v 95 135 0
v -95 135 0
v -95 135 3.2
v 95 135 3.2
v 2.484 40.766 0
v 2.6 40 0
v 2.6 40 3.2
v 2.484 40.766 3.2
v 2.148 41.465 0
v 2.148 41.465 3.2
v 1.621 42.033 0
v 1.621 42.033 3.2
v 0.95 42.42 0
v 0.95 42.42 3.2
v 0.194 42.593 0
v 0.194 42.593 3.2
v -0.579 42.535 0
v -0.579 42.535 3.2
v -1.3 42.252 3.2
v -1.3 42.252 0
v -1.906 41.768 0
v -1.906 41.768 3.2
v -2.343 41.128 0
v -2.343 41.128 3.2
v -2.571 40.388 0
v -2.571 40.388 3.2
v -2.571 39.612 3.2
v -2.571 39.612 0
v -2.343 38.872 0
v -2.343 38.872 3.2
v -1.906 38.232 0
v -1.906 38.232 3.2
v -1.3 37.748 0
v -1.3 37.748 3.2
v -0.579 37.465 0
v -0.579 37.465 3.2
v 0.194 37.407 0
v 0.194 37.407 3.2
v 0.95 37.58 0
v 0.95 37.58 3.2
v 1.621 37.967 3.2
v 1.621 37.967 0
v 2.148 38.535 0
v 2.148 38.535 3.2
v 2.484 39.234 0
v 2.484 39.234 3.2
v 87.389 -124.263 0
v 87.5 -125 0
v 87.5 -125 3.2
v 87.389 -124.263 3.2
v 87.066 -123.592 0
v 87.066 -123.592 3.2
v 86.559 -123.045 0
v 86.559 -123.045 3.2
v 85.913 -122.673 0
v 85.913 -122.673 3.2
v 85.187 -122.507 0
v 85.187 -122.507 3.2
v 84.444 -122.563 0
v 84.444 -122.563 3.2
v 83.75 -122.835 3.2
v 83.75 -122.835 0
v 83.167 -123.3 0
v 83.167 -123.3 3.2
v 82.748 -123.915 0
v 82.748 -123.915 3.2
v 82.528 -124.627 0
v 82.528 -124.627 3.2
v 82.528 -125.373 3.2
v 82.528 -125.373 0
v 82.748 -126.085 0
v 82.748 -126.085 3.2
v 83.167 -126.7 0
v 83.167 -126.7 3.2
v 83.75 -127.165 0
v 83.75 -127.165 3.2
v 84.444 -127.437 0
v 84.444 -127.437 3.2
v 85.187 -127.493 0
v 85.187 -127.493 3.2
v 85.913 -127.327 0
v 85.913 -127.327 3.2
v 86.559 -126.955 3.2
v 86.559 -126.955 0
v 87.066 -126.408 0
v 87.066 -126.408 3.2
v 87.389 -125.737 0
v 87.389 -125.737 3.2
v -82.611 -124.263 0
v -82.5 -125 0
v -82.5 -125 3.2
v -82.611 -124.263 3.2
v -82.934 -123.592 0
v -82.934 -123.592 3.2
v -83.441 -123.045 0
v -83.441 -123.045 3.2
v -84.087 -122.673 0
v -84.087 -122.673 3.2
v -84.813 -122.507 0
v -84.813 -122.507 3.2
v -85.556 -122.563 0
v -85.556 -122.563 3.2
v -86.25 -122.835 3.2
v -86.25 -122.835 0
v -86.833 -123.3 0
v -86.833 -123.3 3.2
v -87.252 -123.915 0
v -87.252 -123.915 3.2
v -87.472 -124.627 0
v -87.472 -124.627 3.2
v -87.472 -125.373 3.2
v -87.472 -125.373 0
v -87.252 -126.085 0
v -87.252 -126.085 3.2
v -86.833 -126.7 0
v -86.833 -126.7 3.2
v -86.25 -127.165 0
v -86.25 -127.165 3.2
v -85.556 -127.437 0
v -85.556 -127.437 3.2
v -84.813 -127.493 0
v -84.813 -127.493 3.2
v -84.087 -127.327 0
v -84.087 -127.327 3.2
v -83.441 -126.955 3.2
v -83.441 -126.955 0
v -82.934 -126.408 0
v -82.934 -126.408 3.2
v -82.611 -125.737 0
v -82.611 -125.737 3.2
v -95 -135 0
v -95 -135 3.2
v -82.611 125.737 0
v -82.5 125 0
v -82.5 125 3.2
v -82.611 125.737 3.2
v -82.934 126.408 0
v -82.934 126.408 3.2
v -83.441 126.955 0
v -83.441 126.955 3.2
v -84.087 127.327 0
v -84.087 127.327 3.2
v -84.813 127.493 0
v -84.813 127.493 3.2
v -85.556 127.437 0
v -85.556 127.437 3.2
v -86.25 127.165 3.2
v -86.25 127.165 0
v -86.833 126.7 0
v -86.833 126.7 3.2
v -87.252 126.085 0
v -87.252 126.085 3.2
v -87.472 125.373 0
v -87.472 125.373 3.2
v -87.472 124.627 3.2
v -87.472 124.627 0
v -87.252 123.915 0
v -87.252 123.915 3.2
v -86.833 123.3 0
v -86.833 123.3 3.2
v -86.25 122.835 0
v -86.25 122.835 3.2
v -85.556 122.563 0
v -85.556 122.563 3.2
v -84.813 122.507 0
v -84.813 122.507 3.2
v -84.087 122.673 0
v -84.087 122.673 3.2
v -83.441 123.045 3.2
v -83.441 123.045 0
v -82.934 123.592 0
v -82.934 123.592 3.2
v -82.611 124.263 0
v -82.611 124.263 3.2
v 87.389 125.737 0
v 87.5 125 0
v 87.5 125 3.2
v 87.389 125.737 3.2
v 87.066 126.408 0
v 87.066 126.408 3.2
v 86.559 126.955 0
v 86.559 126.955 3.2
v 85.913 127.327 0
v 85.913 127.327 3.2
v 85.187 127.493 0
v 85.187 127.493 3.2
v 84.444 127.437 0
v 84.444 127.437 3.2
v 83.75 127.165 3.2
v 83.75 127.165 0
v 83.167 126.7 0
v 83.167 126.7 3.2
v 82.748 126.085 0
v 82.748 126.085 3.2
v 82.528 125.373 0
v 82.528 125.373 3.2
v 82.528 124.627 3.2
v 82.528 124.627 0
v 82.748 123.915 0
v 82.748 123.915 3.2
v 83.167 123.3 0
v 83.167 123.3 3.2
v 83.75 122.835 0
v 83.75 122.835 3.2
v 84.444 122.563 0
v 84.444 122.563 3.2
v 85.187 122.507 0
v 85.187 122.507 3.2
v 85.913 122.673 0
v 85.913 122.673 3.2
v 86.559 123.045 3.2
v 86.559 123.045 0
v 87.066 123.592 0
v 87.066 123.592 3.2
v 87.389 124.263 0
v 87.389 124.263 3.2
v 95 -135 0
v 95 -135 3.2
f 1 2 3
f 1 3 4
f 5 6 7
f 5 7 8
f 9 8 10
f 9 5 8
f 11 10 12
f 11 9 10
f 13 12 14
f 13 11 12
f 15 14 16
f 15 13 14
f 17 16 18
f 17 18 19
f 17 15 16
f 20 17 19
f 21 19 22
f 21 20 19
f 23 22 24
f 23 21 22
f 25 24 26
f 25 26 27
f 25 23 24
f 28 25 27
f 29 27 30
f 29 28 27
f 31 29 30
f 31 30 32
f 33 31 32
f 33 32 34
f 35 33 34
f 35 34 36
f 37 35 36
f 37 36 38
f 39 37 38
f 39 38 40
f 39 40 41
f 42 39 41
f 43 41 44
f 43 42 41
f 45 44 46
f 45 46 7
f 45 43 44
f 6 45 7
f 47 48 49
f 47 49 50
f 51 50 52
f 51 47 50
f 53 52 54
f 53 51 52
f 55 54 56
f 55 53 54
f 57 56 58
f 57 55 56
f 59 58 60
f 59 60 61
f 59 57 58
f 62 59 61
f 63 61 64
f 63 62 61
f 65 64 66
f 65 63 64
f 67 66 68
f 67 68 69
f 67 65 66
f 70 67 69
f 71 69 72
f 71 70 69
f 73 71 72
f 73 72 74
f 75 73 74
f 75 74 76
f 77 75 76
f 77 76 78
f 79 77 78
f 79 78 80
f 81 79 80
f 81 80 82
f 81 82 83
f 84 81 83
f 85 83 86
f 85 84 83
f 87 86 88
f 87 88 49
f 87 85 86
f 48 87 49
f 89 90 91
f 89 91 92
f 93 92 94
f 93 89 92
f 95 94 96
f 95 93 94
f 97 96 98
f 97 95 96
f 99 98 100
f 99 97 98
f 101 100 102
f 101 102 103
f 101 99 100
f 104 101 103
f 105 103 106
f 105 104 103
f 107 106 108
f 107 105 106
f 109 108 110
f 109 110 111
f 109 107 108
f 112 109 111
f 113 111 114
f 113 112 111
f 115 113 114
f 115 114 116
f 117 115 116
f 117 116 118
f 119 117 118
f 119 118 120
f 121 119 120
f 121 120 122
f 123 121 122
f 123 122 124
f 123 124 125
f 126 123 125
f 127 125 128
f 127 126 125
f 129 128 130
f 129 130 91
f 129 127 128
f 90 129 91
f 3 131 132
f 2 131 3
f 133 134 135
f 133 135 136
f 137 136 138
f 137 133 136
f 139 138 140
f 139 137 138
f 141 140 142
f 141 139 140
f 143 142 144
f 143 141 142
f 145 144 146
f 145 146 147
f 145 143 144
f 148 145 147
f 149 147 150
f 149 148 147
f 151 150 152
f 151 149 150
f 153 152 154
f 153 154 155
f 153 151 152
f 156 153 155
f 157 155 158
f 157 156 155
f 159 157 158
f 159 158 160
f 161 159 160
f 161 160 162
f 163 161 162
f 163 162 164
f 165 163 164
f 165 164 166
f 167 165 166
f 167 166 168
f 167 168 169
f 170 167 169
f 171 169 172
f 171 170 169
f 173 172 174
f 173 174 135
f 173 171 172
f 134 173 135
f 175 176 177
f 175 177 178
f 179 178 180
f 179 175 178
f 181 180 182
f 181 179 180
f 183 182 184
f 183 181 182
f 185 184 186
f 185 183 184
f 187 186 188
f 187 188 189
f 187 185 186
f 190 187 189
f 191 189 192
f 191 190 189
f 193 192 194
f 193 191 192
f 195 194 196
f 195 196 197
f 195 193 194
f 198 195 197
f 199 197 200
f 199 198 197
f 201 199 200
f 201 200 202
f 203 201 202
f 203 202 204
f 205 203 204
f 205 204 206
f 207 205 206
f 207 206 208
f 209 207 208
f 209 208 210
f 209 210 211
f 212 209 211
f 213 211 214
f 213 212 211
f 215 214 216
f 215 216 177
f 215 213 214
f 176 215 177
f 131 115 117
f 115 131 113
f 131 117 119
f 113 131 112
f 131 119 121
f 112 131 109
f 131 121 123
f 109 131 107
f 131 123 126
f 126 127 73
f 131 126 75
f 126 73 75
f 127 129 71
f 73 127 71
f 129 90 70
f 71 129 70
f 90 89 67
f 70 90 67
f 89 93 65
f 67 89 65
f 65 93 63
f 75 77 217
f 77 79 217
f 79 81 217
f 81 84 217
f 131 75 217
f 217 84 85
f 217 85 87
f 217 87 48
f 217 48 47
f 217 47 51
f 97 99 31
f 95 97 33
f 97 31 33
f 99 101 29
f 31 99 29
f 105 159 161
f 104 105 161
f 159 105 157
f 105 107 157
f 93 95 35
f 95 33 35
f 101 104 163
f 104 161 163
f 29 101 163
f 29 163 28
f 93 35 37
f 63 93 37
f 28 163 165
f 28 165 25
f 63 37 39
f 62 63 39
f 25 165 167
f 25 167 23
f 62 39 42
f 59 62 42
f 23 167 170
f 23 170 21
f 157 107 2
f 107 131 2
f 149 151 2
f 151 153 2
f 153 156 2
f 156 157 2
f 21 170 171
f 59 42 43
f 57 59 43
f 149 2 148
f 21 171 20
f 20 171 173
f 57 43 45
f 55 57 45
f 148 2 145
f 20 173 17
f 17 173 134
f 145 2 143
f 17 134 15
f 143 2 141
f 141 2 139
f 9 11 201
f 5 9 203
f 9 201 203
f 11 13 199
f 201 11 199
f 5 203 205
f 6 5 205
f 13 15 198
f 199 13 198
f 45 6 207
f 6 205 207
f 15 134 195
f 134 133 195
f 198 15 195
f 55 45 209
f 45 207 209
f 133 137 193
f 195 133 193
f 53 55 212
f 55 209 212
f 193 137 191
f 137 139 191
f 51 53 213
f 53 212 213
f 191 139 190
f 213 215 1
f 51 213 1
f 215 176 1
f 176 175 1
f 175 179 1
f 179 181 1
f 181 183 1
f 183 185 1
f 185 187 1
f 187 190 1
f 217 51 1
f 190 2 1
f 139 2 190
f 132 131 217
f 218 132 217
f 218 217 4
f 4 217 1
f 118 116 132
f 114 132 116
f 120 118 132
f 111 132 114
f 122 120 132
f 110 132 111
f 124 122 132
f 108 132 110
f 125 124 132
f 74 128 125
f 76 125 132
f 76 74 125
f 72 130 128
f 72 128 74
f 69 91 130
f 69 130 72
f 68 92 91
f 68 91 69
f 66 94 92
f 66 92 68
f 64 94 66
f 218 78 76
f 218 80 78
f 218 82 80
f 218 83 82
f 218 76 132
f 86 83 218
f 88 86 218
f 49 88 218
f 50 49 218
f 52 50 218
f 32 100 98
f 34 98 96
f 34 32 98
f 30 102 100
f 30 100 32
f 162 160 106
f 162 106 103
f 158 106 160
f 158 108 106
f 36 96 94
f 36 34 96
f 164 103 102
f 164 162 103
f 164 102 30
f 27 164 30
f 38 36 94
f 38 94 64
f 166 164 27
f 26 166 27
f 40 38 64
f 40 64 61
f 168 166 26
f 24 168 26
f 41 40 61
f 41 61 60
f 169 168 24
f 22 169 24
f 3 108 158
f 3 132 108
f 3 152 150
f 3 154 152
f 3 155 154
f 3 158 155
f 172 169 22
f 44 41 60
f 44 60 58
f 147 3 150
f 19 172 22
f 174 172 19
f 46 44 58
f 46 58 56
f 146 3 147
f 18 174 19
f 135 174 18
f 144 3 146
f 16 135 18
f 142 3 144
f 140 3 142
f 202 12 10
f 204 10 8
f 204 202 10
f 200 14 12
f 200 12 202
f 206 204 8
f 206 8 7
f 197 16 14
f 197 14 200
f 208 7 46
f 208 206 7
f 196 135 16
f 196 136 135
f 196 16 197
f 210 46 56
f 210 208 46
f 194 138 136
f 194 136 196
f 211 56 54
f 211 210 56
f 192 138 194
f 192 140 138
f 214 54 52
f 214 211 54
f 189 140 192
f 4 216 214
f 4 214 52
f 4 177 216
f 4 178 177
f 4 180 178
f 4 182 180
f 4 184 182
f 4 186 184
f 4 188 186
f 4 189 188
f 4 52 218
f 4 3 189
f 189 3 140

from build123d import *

# Parameters (mm, degrees)
F0_W     = 190
F0_H     = 270
F0_R     = 2.5
F0_R_2   = 80
F0_R_3   = 2.6
F1_DEPTH = 3.2


# Not quite as in the source:
# - a feature names something its author has since deleted; it is built from what else it names


with BuildPart() as f1:
    # F0 (on Top) → F1 (new body)
    with BuildSketch(Plane.XY):
        Rectangle(F0_W, F0_H)
        with Locations((-85, -125)):
            Circle(F0_R, mode=Mode.SUBTRACT)
        with Locations((85, -125)):
            Circle(F0_R, mode=Mode.SUBTRACT)
        with Locations((-85, 125)):
            Circle(F0_R, mode=Mode.SUBTRACT)
        with Locations((0, 40)):
            Circle(F0_R_2, mode=Mode.SUBTRACT)
        with Locations((85, 125)):
            Circle(F0_R, mode=Mode.SUBTRACT)
        with Locations((0, 40)):
            Circle(F0_R_2)
        with Locations((0, 40)):
            Circle(F0_R_3, mode=Mode.SUBTRACT)
    extrude(amount=F1_DEPTH)


solid = f1.part
